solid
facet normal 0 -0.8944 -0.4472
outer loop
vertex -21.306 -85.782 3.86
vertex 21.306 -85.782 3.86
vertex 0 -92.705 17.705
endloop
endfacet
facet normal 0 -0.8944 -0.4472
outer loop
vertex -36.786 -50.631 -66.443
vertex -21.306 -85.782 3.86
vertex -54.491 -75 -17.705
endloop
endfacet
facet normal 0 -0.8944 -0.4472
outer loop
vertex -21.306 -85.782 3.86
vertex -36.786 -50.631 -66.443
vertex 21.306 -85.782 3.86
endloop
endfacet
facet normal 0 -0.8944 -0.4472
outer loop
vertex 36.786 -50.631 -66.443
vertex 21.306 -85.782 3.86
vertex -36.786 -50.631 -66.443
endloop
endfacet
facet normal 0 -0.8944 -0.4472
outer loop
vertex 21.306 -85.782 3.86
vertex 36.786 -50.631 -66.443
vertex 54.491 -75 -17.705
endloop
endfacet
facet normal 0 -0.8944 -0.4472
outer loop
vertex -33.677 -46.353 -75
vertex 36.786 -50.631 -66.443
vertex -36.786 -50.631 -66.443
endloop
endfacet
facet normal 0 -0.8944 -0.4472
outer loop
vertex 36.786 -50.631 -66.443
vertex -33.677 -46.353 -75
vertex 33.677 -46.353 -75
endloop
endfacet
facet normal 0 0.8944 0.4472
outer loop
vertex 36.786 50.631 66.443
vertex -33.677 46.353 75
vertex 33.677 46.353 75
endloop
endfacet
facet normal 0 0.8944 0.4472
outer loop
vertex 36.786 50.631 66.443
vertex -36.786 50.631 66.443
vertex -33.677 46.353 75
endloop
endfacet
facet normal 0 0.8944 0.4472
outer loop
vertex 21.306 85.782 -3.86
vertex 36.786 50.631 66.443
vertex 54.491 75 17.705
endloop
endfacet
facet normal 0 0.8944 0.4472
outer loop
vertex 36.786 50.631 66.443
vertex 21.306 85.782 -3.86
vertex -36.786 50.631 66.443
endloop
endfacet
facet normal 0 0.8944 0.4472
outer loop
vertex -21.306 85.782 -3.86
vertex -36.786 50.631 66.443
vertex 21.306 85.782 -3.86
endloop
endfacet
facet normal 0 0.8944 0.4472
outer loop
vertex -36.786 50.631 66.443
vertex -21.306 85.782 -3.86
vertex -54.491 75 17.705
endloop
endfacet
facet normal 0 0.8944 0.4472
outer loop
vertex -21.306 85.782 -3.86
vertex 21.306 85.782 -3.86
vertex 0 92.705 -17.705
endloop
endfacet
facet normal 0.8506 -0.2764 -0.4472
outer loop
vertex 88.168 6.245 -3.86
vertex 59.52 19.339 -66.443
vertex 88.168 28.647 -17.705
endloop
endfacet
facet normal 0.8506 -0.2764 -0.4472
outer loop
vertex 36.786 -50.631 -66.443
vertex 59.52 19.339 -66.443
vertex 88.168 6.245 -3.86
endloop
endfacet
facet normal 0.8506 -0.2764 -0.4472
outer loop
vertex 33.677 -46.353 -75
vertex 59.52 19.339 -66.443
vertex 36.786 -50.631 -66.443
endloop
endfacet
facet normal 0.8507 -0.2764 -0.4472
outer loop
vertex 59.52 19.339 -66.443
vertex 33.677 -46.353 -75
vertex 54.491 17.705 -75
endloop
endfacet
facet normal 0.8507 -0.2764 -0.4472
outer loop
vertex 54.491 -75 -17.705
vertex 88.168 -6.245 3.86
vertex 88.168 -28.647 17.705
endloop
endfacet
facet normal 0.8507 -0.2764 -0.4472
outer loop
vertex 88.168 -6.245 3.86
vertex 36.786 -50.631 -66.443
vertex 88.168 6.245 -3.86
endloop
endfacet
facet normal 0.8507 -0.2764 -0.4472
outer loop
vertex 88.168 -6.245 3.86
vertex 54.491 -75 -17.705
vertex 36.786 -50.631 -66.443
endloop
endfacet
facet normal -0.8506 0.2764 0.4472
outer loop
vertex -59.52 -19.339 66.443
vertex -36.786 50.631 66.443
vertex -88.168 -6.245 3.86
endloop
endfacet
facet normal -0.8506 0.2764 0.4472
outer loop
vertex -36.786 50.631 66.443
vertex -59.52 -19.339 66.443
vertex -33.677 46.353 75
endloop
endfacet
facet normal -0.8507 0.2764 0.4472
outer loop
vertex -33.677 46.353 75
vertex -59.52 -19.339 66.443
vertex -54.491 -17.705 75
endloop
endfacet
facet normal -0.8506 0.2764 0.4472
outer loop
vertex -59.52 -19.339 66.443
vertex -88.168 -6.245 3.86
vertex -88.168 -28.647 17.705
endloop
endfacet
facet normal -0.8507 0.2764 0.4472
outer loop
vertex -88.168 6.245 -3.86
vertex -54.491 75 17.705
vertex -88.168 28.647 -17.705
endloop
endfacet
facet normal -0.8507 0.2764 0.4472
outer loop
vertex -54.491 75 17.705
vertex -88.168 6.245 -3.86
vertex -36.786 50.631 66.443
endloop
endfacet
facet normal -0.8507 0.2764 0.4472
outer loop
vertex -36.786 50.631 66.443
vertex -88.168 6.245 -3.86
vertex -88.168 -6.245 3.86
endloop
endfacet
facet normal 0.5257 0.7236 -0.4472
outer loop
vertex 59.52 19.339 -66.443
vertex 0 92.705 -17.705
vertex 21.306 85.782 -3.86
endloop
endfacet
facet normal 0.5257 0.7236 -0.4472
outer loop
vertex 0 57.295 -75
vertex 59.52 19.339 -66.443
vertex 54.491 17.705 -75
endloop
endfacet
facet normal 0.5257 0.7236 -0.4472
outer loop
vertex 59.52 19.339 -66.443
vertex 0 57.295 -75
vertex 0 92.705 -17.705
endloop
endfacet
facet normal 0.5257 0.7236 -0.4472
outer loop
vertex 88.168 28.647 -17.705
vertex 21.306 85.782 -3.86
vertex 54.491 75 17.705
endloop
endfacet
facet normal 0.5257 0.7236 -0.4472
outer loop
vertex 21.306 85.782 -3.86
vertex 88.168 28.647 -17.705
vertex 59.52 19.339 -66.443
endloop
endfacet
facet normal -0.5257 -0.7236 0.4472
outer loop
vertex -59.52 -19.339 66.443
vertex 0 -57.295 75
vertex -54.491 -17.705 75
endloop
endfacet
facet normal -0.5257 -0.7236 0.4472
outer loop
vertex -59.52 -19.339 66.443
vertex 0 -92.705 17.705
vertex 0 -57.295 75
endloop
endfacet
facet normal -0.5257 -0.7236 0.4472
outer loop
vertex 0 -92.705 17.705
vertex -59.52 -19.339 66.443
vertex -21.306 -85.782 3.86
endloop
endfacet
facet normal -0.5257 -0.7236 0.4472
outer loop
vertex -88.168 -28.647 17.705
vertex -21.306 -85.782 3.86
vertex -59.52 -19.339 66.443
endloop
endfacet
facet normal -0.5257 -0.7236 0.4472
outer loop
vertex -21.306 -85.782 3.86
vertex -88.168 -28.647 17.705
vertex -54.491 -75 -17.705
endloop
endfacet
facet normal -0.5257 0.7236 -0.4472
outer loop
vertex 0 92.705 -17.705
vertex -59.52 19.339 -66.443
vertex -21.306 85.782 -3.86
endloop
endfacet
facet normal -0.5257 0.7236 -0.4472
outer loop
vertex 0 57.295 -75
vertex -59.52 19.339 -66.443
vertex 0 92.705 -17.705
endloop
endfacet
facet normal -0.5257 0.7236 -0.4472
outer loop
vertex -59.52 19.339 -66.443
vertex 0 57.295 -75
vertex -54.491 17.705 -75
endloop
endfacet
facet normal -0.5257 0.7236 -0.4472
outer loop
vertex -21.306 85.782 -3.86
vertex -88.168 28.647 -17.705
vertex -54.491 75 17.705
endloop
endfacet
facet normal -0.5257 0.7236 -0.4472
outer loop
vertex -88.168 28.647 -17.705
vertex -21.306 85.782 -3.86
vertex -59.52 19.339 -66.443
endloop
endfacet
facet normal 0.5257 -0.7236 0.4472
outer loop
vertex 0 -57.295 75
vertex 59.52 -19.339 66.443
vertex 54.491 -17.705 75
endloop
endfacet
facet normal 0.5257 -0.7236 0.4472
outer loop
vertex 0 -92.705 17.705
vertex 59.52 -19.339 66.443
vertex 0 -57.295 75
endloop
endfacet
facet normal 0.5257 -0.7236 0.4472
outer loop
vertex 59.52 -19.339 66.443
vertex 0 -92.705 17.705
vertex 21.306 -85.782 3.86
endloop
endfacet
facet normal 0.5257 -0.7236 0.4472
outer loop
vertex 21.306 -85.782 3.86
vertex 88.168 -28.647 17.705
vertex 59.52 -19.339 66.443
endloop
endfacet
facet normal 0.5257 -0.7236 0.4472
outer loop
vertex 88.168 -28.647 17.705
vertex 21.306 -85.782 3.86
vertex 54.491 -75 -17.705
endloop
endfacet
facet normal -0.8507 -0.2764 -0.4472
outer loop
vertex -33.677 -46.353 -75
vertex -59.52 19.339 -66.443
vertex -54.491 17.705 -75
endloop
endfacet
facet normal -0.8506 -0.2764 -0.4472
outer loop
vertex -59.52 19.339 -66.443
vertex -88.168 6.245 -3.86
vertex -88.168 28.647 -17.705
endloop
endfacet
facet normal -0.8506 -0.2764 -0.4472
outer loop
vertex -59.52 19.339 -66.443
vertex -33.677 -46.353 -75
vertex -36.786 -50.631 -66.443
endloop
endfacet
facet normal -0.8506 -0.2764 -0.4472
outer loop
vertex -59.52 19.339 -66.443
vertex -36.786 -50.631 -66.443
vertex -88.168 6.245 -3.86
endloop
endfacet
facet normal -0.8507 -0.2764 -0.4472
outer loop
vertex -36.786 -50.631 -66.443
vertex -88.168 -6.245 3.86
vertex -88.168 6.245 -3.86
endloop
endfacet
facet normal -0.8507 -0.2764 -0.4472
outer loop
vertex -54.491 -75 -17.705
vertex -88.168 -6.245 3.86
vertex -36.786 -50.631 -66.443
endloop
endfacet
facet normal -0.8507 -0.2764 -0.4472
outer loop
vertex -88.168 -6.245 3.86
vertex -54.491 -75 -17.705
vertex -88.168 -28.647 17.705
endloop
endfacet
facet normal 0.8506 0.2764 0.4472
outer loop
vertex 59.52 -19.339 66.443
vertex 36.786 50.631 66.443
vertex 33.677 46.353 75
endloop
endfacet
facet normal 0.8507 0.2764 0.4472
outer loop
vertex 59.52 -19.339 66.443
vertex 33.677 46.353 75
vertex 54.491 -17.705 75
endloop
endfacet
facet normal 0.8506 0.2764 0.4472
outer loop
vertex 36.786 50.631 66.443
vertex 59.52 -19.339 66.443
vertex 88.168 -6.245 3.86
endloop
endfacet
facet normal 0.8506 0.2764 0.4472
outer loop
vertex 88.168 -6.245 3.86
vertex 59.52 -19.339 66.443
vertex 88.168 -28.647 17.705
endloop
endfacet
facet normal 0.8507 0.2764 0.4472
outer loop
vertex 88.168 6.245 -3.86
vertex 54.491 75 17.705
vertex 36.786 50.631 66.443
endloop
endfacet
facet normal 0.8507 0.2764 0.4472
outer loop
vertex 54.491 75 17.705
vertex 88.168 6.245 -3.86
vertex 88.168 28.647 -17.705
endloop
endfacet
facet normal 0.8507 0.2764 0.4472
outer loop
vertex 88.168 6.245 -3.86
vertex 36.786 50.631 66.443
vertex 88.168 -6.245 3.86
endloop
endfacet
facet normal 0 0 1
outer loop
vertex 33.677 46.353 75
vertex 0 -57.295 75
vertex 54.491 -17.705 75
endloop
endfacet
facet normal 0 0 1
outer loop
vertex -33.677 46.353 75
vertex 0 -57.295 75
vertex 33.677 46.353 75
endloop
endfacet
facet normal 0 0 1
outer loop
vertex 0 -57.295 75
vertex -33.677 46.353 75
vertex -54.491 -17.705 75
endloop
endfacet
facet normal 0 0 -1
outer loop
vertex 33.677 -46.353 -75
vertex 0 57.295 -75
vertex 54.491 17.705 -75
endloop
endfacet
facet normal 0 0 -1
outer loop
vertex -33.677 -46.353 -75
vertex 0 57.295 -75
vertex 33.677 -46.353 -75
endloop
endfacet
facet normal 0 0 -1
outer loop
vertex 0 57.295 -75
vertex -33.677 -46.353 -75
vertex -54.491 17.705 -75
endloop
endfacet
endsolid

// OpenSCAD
//create a dodecahedron by intersecting 6 boxes
module dodecahedron(height) 
{
        scale([height,height,height]) //scale by height parameter
        {
                intersection(){
                        //make a cube
                        cube([2,2,1], center = true); 
                        intersection_for(i=[0:4]) //loop i from 0 to 4, and intersect results
                        { 
                                //make a cube, rotate it 116.565 degrees around the X axis,
                                //then 72*i around the Z axis
                                rotate([0,0,72*i])
                                        rotate([116.565,0,0])
                                        cube([2,2,1], center = true); 
                        }
                }
        }
}

dodecahedron(150);
